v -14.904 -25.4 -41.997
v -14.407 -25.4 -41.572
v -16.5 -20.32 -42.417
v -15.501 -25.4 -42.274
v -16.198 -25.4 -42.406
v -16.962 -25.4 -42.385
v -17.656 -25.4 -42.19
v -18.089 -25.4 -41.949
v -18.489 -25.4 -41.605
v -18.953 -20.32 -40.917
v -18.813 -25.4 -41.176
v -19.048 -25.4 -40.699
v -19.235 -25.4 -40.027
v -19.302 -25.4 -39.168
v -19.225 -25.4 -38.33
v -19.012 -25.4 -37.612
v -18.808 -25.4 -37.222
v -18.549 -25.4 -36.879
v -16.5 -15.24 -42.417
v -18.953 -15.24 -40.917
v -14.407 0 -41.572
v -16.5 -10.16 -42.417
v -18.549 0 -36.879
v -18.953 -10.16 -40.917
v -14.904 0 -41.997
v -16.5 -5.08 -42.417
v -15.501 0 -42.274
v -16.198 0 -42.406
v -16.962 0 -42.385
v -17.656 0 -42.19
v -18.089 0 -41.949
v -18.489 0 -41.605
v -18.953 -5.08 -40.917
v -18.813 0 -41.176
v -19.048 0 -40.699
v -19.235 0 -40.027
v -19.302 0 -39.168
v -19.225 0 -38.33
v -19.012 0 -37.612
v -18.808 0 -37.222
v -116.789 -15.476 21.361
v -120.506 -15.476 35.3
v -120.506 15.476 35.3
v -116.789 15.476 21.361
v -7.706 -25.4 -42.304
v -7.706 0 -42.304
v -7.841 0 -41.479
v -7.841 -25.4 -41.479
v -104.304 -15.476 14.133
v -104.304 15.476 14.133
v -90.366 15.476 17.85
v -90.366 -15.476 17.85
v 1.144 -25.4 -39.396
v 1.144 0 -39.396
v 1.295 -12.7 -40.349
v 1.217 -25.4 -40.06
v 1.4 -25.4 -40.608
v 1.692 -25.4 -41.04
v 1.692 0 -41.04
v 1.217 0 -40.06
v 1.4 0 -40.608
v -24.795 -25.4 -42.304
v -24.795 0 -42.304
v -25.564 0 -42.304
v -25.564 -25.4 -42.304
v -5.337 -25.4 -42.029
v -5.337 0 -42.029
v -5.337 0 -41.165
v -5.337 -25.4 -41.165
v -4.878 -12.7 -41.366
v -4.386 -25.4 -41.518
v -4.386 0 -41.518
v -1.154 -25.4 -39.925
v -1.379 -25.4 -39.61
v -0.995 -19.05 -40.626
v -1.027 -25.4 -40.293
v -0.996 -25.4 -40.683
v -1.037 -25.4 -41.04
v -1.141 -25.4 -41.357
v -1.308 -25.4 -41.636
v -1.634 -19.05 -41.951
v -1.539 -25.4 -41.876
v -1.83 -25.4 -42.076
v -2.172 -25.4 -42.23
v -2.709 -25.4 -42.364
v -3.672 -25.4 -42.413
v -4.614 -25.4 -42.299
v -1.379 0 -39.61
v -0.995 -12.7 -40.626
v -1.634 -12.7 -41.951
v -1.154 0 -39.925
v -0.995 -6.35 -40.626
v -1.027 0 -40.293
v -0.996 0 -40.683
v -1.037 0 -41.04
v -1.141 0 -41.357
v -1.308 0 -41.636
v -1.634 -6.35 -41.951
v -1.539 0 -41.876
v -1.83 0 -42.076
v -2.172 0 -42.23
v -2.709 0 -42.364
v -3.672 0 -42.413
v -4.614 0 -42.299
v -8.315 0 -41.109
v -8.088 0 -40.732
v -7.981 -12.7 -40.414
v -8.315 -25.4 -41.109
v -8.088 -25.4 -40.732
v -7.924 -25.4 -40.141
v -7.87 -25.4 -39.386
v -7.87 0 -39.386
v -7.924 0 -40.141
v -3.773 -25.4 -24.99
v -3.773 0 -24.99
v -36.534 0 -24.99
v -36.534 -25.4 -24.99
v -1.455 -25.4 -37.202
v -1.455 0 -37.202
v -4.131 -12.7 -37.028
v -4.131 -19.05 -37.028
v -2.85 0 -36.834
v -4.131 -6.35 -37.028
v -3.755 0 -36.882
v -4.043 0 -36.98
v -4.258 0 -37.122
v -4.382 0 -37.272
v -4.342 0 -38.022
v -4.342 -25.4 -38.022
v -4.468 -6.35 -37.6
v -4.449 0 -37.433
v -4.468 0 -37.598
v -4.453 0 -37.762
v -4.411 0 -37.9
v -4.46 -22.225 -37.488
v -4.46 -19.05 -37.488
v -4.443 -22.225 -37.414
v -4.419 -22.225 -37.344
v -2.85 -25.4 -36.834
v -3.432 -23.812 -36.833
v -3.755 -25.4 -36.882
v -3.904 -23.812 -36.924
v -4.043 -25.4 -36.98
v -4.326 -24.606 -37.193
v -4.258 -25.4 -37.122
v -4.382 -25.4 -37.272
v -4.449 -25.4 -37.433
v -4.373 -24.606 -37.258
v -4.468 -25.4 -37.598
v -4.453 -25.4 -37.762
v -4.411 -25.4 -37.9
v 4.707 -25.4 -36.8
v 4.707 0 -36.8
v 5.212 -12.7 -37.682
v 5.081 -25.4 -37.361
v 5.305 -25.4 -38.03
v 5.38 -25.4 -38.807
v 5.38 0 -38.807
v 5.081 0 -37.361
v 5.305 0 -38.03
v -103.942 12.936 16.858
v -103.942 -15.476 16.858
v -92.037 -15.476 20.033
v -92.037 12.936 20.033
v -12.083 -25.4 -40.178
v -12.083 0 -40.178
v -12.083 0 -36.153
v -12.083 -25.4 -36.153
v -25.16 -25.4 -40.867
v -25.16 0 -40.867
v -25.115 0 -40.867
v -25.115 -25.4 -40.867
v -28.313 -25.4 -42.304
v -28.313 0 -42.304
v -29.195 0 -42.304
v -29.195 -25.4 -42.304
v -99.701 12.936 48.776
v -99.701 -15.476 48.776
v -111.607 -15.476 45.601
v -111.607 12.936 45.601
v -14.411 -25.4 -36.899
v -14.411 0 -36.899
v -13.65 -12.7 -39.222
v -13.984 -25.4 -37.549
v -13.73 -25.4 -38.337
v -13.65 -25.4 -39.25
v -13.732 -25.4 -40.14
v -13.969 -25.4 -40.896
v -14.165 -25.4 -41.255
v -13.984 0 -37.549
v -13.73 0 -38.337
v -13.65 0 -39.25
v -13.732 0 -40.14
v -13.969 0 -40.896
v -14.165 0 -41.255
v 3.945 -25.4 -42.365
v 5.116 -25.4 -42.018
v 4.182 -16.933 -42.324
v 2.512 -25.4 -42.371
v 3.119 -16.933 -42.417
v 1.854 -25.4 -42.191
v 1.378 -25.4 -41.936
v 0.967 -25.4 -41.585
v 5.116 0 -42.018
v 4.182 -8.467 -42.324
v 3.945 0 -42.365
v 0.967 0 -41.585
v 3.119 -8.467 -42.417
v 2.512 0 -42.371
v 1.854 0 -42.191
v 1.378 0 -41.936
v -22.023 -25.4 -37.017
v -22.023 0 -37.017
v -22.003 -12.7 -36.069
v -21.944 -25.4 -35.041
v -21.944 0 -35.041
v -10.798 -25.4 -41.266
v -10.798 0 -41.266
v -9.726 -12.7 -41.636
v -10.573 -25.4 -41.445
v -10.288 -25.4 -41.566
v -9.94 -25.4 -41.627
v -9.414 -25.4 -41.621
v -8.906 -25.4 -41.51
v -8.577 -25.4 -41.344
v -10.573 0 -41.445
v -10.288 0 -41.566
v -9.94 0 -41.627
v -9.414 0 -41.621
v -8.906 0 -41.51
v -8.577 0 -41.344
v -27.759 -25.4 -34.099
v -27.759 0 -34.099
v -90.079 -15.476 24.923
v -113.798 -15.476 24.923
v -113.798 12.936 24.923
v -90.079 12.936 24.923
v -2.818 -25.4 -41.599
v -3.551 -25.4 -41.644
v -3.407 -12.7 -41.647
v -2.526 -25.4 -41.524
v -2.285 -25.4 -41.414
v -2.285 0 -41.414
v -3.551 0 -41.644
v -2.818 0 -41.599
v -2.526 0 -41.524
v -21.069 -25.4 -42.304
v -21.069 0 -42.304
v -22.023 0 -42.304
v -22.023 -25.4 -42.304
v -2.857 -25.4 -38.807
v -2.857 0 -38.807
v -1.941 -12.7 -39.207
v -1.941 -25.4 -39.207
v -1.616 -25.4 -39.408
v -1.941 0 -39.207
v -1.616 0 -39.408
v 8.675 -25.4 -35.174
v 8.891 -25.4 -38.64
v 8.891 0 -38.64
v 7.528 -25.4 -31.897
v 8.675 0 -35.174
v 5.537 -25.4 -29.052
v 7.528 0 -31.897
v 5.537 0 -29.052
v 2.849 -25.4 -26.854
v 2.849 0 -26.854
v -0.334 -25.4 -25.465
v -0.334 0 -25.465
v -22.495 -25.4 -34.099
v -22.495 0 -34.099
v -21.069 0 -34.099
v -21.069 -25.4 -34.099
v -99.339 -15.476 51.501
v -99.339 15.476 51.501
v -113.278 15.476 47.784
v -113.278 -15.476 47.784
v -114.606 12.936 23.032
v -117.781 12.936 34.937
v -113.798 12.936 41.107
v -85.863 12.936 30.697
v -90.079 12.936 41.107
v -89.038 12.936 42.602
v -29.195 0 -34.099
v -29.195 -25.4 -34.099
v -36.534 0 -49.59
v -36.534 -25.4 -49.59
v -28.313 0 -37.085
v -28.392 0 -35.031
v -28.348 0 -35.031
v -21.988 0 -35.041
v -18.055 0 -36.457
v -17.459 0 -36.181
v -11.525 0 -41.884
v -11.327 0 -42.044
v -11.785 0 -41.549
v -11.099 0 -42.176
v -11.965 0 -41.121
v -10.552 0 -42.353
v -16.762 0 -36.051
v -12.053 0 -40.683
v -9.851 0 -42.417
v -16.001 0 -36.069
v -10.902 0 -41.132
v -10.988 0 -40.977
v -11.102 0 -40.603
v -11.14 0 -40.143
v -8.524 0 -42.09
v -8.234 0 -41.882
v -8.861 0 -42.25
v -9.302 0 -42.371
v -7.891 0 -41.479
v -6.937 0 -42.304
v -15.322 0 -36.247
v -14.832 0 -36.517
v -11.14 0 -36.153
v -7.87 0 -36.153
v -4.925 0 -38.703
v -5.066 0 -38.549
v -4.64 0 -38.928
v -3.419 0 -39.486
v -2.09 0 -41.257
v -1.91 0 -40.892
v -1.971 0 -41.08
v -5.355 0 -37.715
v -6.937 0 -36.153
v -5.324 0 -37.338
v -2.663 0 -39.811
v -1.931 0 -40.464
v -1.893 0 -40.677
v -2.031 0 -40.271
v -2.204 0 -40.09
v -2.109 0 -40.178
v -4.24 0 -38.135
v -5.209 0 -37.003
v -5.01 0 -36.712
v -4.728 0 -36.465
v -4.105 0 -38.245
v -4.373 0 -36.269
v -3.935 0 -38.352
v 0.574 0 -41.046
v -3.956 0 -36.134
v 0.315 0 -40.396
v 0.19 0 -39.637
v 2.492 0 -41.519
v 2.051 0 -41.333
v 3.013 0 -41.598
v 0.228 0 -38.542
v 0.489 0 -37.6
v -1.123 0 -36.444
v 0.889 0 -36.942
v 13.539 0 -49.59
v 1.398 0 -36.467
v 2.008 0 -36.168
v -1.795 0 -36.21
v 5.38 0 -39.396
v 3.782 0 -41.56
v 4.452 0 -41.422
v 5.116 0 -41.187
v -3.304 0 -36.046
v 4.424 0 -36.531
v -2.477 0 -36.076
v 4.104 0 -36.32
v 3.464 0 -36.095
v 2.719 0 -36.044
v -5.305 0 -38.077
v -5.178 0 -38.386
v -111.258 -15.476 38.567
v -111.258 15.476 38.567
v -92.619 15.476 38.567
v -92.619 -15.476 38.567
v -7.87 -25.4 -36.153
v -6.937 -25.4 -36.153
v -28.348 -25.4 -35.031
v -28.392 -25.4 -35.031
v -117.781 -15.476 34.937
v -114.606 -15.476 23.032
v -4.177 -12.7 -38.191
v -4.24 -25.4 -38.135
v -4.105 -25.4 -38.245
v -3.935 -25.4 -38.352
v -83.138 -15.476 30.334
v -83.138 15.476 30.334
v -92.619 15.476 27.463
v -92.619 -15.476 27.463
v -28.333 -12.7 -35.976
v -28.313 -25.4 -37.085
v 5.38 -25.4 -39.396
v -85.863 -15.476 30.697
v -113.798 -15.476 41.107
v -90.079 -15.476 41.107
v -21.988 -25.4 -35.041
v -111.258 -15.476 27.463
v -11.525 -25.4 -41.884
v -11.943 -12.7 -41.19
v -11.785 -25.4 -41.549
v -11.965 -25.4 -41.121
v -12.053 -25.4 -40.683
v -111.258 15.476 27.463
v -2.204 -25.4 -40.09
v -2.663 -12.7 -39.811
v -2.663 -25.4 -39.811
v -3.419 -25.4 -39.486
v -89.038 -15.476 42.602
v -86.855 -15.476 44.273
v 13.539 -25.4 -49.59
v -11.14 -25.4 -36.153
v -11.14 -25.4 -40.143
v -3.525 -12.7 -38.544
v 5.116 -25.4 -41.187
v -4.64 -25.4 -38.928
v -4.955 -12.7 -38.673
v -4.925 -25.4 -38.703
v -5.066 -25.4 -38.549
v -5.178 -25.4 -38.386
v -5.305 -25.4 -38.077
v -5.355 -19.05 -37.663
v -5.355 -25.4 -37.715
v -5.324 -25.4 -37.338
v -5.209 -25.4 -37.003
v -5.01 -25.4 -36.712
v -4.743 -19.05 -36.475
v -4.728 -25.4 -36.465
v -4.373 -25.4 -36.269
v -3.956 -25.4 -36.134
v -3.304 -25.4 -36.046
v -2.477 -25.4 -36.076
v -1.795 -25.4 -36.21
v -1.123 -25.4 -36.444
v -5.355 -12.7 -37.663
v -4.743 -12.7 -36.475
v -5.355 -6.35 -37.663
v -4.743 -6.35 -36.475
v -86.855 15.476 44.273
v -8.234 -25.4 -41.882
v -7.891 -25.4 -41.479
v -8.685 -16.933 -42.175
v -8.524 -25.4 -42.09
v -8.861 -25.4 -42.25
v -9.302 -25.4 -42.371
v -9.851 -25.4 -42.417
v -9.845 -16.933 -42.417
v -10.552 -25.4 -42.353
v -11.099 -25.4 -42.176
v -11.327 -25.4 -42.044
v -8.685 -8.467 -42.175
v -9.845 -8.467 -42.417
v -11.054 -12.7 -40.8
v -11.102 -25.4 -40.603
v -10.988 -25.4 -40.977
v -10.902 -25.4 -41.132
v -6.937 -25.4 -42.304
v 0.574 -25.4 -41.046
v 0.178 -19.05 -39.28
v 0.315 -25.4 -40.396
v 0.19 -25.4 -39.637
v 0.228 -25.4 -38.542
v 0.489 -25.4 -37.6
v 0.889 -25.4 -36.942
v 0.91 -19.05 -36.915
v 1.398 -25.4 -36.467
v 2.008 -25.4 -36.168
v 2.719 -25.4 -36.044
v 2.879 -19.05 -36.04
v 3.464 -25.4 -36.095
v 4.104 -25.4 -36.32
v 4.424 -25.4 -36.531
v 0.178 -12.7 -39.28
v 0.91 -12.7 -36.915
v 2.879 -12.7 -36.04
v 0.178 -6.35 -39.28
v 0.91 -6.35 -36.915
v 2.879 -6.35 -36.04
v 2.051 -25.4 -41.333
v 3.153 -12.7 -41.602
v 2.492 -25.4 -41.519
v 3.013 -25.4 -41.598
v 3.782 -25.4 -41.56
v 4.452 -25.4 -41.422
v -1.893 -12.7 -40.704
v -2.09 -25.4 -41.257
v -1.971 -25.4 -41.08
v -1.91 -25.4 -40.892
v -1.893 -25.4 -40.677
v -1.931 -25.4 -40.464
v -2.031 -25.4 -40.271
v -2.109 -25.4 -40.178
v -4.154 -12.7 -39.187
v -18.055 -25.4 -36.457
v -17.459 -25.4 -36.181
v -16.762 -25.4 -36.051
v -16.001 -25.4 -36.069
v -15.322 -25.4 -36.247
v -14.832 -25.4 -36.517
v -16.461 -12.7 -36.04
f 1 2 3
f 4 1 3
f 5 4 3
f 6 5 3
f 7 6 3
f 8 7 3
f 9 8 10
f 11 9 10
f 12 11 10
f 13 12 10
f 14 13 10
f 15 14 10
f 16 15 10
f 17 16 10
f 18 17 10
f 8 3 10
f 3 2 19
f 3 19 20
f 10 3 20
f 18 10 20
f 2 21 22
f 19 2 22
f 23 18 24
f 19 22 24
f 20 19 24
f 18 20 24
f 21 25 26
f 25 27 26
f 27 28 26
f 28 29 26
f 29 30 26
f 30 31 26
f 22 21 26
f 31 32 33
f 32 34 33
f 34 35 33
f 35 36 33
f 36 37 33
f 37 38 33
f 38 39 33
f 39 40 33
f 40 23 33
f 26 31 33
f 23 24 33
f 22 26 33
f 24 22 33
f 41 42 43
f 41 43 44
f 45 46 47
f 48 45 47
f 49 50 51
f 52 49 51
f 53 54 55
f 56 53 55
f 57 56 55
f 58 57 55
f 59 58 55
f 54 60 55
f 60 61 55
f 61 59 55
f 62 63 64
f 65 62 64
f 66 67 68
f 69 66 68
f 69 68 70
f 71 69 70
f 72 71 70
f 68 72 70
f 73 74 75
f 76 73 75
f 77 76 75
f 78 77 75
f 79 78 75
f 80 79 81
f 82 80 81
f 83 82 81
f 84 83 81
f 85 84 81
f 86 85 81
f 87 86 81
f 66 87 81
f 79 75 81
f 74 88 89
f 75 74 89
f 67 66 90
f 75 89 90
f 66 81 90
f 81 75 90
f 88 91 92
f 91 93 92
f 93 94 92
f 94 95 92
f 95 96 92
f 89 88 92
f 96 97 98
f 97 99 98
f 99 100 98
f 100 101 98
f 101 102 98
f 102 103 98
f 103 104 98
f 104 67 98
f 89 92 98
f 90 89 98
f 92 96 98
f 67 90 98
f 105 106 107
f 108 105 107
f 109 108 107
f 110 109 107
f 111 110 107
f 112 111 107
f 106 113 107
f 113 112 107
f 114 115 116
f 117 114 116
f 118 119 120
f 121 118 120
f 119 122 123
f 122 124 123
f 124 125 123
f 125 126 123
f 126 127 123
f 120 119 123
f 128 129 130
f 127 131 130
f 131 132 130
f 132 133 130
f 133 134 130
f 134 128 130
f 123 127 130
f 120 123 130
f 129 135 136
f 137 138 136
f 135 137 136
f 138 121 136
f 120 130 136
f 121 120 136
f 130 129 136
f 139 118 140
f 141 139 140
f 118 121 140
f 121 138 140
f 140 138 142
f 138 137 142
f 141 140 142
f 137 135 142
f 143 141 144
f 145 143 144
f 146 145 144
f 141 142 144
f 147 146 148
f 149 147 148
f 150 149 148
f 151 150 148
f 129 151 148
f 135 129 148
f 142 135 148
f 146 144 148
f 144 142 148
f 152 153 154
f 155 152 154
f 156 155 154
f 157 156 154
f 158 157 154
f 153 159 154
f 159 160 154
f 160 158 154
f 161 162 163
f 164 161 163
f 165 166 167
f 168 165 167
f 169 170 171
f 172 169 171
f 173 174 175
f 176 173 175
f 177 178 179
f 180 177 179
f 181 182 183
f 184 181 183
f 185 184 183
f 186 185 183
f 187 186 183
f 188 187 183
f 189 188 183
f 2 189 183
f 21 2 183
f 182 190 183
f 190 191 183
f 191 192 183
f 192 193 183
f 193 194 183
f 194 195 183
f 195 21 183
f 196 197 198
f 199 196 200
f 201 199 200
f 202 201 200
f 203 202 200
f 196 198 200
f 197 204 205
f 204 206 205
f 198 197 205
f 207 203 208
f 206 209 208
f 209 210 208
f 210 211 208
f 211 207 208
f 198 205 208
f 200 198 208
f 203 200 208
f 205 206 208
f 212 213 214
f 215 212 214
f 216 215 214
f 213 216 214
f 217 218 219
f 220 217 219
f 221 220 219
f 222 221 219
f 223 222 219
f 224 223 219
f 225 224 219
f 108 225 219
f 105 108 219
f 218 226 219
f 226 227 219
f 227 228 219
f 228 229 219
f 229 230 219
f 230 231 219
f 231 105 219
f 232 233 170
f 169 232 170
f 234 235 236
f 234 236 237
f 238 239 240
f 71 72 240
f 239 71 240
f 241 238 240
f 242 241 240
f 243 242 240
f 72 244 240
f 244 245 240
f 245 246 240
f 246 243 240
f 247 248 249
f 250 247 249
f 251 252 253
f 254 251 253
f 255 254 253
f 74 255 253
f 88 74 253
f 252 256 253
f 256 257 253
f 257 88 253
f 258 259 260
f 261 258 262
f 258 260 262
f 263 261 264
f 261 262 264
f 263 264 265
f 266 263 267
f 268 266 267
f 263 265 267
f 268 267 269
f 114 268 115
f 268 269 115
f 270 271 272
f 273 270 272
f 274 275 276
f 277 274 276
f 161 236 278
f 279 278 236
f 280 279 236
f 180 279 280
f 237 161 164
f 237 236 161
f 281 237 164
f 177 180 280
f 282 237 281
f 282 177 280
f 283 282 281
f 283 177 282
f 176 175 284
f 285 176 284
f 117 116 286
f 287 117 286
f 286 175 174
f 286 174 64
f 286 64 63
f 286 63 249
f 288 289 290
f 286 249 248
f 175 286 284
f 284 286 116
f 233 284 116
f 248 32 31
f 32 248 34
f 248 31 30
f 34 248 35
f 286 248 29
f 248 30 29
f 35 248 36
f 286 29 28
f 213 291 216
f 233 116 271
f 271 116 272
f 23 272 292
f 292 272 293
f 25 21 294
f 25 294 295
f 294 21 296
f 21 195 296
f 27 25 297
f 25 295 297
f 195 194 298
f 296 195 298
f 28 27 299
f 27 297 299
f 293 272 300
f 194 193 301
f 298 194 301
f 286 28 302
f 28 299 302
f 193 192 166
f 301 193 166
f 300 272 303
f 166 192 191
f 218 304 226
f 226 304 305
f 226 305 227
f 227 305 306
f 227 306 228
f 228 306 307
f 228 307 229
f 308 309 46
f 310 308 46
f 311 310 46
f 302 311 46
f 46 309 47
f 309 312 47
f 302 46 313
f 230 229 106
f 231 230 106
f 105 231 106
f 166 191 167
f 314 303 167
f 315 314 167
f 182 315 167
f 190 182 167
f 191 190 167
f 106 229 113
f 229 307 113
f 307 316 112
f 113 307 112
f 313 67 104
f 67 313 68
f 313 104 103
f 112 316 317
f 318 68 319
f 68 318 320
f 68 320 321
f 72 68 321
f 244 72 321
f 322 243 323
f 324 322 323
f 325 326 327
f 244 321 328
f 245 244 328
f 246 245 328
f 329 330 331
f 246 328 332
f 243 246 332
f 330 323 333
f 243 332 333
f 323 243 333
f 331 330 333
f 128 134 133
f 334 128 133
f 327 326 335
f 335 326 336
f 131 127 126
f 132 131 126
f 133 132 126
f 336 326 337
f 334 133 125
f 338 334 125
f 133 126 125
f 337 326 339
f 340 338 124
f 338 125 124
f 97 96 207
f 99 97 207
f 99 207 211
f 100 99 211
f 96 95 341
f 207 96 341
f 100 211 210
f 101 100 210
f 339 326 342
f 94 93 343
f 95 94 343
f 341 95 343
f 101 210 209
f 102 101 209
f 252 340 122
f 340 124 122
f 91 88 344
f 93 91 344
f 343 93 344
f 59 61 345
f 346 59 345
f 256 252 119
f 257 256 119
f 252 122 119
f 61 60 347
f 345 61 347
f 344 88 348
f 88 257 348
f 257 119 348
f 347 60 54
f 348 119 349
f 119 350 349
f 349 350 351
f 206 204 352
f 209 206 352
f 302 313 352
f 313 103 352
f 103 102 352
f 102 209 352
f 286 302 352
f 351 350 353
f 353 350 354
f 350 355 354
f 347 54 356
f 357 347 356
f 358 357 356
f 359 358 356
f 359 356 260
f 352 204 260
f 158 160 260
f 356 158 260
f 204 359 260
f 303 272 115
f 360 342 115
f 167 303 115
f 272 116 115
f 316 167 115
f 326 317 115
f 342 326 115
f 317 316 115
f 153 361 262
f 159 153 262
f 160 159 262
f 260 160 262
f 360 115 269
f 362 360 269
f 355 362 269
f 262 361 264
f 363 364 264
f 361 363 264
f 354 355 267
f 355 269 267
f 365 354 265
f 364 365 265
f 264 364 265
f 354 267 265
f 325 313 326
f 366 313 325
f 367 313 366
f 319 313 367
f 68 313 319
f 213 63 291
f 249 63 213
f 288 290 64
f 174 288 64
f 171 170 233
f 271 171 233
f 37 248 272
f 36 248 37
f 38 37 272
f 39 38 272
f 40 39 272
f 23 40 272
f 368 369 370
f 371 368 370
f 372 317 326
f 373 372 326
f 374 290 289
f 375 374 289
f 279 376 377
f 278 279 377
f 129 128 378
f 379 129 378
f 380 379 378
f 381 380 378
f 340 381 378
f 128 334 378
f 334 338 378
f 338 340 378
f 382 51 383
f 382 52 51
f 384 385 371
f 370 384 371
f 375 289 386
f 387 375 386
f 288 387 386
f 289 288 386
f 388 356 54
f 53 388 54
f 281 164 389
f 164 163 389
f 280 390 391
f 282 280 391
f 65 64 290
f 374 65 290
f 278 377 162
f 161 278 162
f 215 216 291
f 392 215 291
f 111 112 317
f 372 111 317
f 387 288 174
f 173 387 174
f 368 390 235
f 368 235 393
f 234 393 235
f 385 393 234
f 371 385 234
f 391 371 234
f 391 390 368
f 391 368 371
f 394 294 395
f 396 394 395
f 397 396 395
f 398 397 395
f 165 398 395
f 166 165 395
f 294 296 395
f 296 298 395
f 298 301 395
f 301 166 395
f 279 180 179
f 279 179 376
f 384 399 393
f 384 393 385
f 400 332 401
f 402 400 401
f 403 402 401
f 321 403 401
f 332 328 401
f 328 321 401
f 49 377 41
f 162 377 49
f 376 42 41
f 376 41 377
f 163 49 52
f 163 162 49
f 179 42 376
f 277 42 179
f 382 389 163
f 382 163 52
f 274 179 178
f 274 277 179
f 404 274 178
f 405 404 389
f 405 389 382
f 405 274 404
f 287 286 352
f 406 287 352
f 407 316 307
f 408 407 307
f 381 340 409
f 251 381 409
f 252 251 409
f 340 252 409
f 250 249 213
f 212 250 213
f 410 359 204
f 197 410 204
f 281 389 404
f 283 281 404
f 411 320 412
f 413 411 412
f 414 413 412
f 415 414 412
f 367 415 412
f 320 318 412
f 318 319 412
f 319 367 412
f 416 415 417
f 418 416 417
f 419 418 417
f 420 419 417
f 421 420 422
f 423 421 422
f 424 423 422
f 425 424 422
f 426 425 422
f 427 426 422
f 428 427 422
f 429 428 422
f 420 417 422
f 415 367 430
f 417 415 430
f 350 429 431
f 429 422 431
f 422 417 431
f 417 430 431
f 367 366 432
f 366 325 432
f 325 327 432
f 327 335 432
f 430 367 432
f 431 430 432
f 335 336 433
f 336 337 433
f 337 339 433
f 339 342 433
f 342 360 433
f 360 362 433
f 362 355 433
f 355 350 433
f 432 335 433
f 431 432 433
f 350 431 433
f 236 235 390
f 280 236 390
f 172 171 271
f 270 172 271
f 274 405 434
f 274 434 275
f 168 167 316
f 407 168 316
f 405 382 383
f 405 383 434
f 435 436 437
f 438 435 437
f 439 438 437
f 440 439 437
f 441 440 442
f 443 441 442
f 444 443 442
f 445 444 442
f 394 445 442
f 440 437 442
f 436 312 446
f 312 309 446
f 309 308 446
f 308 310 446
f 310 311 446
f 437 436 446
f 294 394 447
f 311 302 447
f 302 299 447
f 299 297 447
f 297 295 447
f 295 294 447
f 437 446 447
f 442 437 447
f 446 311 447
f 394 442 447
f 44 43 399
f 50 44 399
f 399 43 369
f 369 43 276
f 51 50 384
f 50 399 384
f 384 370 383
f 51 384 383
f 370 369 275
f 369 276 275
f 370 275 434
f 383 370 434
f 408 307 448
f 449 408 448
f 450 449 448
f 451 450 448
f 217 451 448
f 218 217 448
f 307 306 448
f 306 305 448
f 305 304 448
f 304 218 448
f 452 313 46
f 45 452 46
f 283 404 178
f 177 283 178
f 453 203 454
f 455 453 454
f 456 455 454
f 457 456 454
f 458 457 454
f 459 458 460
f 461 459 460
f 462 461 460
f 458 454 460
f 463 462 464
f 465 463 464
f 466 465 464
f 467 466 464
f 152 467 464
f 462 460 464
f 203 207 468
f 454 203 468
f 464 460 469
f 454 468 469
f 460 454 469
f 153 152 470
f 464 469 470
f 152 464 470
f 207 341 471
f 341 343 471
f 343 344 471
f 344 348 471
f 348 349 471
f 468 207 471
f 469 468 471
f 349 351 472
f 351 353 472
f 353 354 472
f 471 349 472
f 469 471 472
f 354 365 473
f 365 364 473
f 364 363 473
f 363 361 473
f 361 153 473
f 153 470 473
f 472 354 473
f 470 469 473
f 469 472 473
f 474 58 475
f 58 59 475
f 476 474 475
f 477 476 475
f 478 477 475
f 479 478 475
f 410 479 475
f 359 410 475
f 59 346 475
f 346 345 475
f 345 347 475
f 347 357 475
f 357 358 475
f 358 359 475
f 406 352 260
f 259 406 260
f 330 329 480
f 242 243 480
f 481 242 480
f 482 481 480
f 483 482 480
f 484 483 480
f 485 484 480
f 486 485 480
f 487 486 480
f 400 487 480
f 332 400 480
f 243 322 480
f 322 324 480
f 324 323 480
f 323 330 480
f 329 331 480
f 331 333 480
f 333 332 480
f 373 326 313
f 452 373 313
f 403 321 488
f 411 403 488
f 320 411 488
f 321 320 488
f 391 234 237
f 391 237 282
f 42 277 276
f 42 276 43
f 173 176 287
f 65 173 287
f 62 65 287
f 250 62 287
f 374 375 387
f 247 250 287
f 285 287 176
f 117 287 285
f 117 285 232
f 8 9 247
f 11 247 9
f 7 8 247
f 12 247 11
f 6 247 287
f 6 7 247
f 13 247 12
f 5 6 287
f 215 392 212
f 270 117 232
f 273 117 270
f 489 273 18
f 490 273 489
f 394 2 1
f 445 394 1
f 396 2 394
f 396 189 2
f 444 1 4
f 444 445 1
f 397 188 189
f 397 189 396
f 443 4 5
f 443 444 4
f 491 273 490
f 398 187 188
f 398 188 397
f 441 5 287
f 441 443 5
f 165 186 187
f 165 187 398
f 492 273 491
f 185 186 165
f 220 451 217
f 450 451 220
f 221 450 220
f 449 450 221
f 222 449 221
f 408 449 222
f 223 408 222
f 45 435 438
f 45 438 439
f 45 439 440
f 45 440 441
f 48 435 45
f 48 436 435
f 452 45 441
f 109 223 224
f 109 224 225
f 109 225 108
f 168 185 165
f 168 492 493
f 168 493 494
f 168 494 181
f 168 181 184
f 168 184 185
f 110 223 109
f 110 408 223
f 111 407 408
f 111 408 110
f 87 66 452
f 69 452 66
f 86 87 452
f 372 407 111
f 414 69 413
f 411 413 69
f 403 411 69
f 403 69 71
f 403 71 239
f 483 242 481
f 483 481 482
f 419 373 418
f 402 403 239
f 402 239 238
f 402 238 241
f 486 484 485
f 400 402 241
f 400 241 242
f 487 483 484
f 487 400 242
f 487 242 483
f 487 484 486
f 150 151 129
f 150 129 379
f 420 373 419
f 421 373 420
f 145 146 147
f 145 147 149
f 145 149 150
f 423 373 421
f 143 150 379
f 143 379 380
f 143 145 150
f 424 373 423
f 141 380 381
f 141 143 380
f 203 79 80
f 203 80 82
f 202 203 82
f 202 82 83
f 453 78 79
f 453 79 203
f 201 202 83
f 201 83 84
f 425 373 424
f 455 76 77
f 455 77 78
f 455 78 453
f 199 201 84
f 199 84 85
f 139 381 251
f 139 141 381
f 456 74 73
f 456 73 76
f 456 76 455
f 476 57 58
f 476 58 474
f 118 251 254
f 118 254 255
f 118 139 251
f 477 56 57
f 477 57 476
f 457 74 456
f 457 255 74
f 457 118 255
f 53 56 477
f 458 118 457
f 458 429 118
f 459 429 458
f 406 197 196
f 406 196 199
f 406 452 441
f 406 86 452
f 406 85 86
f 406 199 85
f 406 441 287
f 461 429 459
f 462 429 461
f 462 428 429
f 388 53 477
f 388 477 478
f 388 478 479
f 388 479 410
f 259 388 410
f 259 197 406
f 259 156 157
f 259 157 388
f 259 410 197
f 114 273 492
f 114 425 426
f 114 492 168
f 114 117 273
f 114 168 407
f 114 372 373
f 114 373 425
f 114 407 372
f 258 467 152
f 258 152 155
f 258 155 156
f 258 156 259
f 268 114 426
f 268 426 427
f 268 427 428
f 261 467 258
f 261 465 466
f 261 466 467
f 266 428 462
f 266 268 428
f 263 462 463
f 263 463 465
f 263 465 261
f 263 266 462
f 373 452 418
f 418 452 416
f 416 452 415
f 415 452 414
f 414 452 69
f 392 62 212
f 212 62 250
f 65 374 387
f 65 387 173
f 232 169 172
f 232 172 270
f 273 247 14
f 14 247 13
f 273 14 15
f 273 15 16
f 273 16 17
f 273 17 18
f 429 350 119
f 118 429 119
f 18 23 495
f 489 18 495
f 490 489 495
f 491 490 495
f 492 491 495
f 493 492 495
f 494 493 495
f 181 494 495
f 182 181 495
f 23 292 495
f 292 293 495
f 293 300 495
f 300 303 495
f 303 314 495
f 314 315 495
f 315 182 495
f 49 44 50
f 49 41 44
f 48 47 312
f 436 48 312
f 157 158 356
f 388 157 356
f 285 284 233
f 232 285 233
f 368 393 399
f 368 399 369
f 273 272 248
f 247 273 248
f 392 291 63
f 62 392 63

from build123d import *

# Parameters (mm, degrees)
F1_DEPTH = 25.4
F2_DEPTH = 15.47605
F3_W     = 18.6392664909
F3_H     = 11.1042335629
F4_DEPTH = 30.9521
F5_T     = -2.54


with BuildPart() as f1:
    # F0 (on Front) → F1 (new body)
    with BuildSketch(Plane.XZ):
        with BuildLine():
            Line((-3.773370779, -24.9902736396), (-36.5339256823, -24.9902736396))
            Line((-36.5339256823, -24.9902736396), (-36.5339256823, -37.2901419178))
            Line((-36.5339256823, -37.2901419178), (-36.5339256823, -49.590010196))
            Line((-36.5339256823, -49.590010196), (13.5391952785, -49.590010196))
            Line((13.5391952785, -49.590010196), (8.8910869166, -38.6397531151))
            ThreePointArc((8.8910869166, -38.6397531151), (5.5365268933, -29.052229571), (-3.773370779, -24.9902736396))
        make_face()
        with BuildLine():
            Line((-24.7953651081, -42.3037852307), (-25.5639865894, -42.3037852307))
            Line((-25.5639865894, -42.3037852307), (-28.347545692, -35.0306146721))
            Line((-28.347545692, -35.0306146721), (-28.3924418066, -35.0306146721))
            add(Edge.make_bspline(
                [(-28.3924418066, -35.0306146721), (-28.313424645, -35.8944159162), (-28.313424645, -37.0850608743)],
                knots=[0, 0, 0, 1, 1, 1], degree=2))
            Line((-28.313424645, -37.0850608743), (-28.313424645, -42.3037852307))
            Line((-28.313424645, -42.3037852307), (-29.1951843349, -42.3037852307))
            Line((-29.1951843349, -42.3037852307), (-29.1951843349, -34.0985713339))
            Line((-29.1951843349, -34.0985713339), (-27.758508669, -34.0985713339))
            Line((-27.758508669, -34.0985713339), (-25.1599215583, -40.8671095648))
            Line((-25.1599215583, -40.8671095648), (-25.1150254438, -40.8671095648))
            Line((-25.1150254438, -40.8671095648), (-22.4948881981, -34.0985713339))
            Line((-22.4948881981, -34.0985713339), (-21.0689875997, -34.0985713339))
            Line((-21.0689875997, -34.0985713339), (-21.0689875997, -42.3037852307))
            Line((-21.0689875997, -42.3037852307), (-22.0225810729, -42.3037852307))
            Line((-22.0225810729, -42.3037852307), (-22.0225810729, -37.0168187802))
            add(Edge.make_bspline(
                [(-22.0225810729, -37.0168187802), (-22.0225810729, -36.1081214215), (-21.9435639113, -35.0413897396)],
                knots=[0, 0, 0, 1, 1, 1], degree=2))
            Line((-21.9435639113, -35.0413897396), (-21.9884600258, -35.0413897396))
            Line((-21.9884600258, -35.0413897396), (-24.7953651081, -42.3037852307))
        make_face(mode=Mode.SUBTRACT)
        with BuildLine():
            add(Edge.make_bspline(
                [(-14.4108938105, -36.8991909601), (-13.6503536299, -37.7585025927), (-13.6503536299, -39.2221159274)],
                knots=[0, 0, 0, 1, 1, 1], degree=2))
            add(Edge.make_bspline(
                [(-13.6503536299, -39.2221159274), (-13.6503536299, -40.7270336874), (-14.4073021213, -41.5719785634)],
                knots=[0, 0, 0, 1, 1, 1], degree=2))
            add(Edge.make_bspline(
                [(-14.4073021213, -41.5719785634), (-15.1642506128, -42.4169234394), (-16.5003589821, -42.4169234394)],
                knots=[0, 0, 0, 1, 1, 1], degree=2))
            add(Edge.make_bspline(
                [(-16.5003589821, -42.4169234394), (-17.32644749, -42.4169234394), (-17.9657681613, -42.0290210096)],
                knots=[0, 0, 0, 1, 1, 1], degree=2))
            add(Edge.make_bspline(
                [(-17.9657681613, -42.0290210096), (-18.6050888326, -41.6411185798), (-18.9534826816, -40.9173932131)],
                knots=[0, 0, 0, 1, 1, 1], degree=2))
            add(Edge.make_bspline(
                [(-18.9534826816, -40.9173932131), (-19.3018765306, -40.1936678464), (-19.3018765306, -39.2221159274)],
                knots=[0, 0, 0, 1, 1, 1], degree=2))
            add(Edge.make_bspline(
                [(-19.3018765306, -39.2221159274), (-19.3018765306, -37.7189940119), (-18.5494176506, -36.8794366697)],
                knots=[0, 0, 0, 1, 1, 1], degree=2))
            add(Edge.make_bspline(
                [(-18.5494176506, -36.8794366697), (-17.7969587706, -36.0398793274), (-16.4608504013, -36.0398793274)],
                knots=[0, 0, 0, 1, 1, 1], degree=2))
            add(Edge.make_bspline(
                [(-16.4608504013, -36.0398793274), (-15.1714339911, -36.0398793274), (-14.4108938105, -36.8991909601)],
                knots=[0, 0, 0, 1, 1, 1], degree=2))
        make_face(mode=Mode.SUBTRACT)
        with BuildLine():
            Line((-12.0825813095, -36.1530175361), (-11.1397629037, -36.1530175361))
            Line((-11.1397629037, -36.1530175361), (-11.1397629037, -40.1433841981))
            add(Edge.make_bspline(
                [(-11.1397629037, -40.1433841981), (-11.1397629037, -40.8958430781), (-10.7976545108, -41.2657870621)],
                knots=[0, 0, 0, 1, 1, 1], degree=2))
            add(Edge.make_bspline(
                [(-10.7976545108, -41.2657870621), (-10.4555461178, -41.6357310461), (-9.7264332174, -41.6357310461)],
                knots=[0, 0, 0, 1, 1, 1], degree=2))
            add(Edge.make_bspline(
                [(-9.7264332174, -41.6357310461), (-8.7602688321, -41.6357310461), (-8.3148993756, -41.1086506612)],
                knots=[0, 0, 0, 1, 1, 1], degree=2))
            add(Edge.make_bspline(
                [(-8.3148993756, -41.1086506612), (-7.8695299192, -40.5815702762), (-7.8695299192, -39.3855377844)],
                knots=[0, 0, 0, 1, 1, 1], degree=2))
            Line((-7.8695299192, -39.3855377844), (-7.8695299192, -36.1530175361))
            Line((-7.8695299192, -36.1530175361), (-6.937486581, -36.1530175361))
            Line((-6.937486581, -36.1530175361), (-6.937486581, -42.3037852307))
            Line((-6.937486581, -42.3037852307), (-7.7061080622, -42.3037852307))
            Line((-7.7061080622, -42.3037852307), (-7.8407964059, -41.4794925674))
            Line((-7.8407964059, -41.4794925674), (-7.8910800542, -41.4794925674))
            add(Edge.make_bspline(
                [(-7.8910800542, -41.4794925674), (-8.1766193428, -41.9338412468), (-8.6848433596, -42.1753823431)],
                knots=[0, 0, 0, 1, 1, 1], degree=2))
            add(Edge.make_bspline(
                [(-8.6848433596, -42.1753823431), (-9.1930673764, -42.4169234394), (-9.8449589598, -42.4169234394)],
                knots=[0, 0, 0, 1, 1, 1], degree=2))
            add(Edge.make_bspline(
                [(-9.8449589598, -42.4169234394), (-10.9673618238, -42.4169234394), (-11.5249715666, -41.8835575984)],
                knots=[0, 0, 0, 1, 1, 1], degree=2))
            add(Edge.make_bspline(
                [(-11.5249715666, -41.8835575984), (-12.0825813095, -41.3501917575), (-12.0825813095, -40.1775052452)],
                knots=[0, 0, 0, 1, 1, 1], degree=2))
            Line((-12.0825813095, -40.1775052452), (-12.0825813095, -36.1530175361))
        make_face(mode=Mode.SUBTRACT)
        with BuildLine():
            add(Edge.make_bspline(
                [(-1.3793475985, -39.6100183572), (-0.9950368579, -40.0140833882), (-0.9950368579, -40.6264663908)],
                knots=[0, 0, 0, 1, 1, 1], degree=2))
            add(Edge.make_bspline(
                [(-0.9950368579, -40.6264663908), (-0.9950368579, -41.4848801012), (-1.6343575292, -41.9509017703)],
                knots=[0, 0, 0, 1, 1, 1], degree=2))
            add(Edge.make_bspline(
                [(-1.6343575292, -41.9509017703), (-2.2736782005, -42.4169234394), (-3.4302021116, -42.4169234394)],
                knots=[0, 0, 0, 1, 1, 1], degree=2))
            add(Edge.make_bspline(
                [(-3.4302021116, -42.4169234394), (-4.6531722722, -42.4169234394), (-5.3373890581, -42.0290210096)],
                knots=[0, 0, 0, 1, 1, 1], degree=2))
            Line((-5.3373890581, -42.0290210096), (-5.3373890581, -41.1652197655))
            add(Edge.make_bspline(
                [(-5.3373890581, -41.1652197655), (-4.8938154462, -41.3897003383), (-4.3864893517, -41.5181032259)],
                knots=[0, 0, 0, 1, 1, 1], degree=2))
            add(Edge.make_bspline(
                [(-4.3864893517, -41.5181032259), (-3.8791632572, -41.6465061136), (-3.406856132, -41.6465061136)],
                knots=[0, 0, 0, 1, 1, 1], degree=2))
            add(Edge.make_bspline(
                [(-3.406856132, -41.6465061136), (-2.6777432316, -41.6465061136), (-2.2853511903, -41.4139442402)],
                knots=[0, 0, 0, 1, 1, 1], degree=2))
            add(Edge.make_bspline(
                [(-2.2853511903, -41.4139442402), (-1.8929591491, -41.1813823667), (-1.8929591491, -40.7036877078)],
                knots=[0, 0, 0, 1, 1, 1], degree=2))
            add(Edge.make_bspline(
                [(-1.8929591491, -40.7036877078), (-1.8929591491, -40.3445187914), (-2.2036402618, -40.0895088607)],
                knots=[0, 0, 0, 1, 1, 1], degree=2))
            add(Edge.make_bspline(
                [(-2.2036402618, -40.0895088607), (-2.5143213746, -39.83449893), (-3.4194270441, -39.486105081)],
                knots=[0, 0, 0, 1, 1, 1], degree=2))
            add(Edge.make_bspline(
                [(-3.4194270441, -39.486105081), (-4.2778407545, -39.1664447453), (-4.6397034378, -38.9275974159)],
                knots=[0, 0, 0, 1, 1, 1], degree=2))
            add(Edge.make_bspline(
                [(-4.6397034378, -38.9275974159), (-5.0015661212, -38.6887500864), (-5.1784568125, -38.3861502743)],
                knots=[0, 0, 0, 1, 1, 1], degree=2))
            add(Edge.make_bspline(
                [(-5.1784568125, -38.3861502743), (-5.3553475039, -38.0835504621), (-5.3553475039, -37.6633228299)],
                knots=[0, 0, 0, 1, 1, 1], degree=2))
            add(Edge.make_bspline(
                [(-5.3553475039, -37.6633228299), (-5.3553475039, -36.9108639498), (-4.7429645013, -36.4753716386)],
                knots=[0, 0, 0, 1, 1, 1], degree=2))
            add(Edge.make_bspline(
                [(-4.7429645013, -36.4753716386), (-4.1305814987, -36.0398793274), (-3.0656456614, -36.0398793274)],
                knots=[0, 0, 0, 1, 1, 1], degree=2))
            add(Edge.make_bspline(
                [(-3.0656456614, -36.0398793274), (-2.0725436073, -36.0398793274), (-1.1225418232, -36.4439443584)],
                knots=[0, 0, 0, 1, 1, 1], degree=2))
            Line((-1.1225418232, -36.4439443584), (-1.454773071, -37.2017907722))
            add(Edge.make_bspline(
                [(-1.454773071, -37.2017907722), (-2.3796330309, -36.8210717207), (-3.1320919109, -36.8210717207)],
                knots=[0, 0, 0, 1, 1, 1], degree=2))
            add(Edge.make_bspline(
                [(-3.1320919109, -36.8210717207), (-3.7947585618, -36.8210717207), (-4.131479421, -37.02849177)],
                knots=[0, 0, 0, 1, 1, 1], degree=2))
            add(Edge.make_bspline(
                [(-4.131479421, -37.02849177), (-4.4682002802, -37.2359118193), (-4.4682002802, -37.6004682695)],
                knots=[0, 0, 0, 1, 1, 1], degree=2))
            add(Edge.make_bspline(
                [(-4.4682002802, -37.6004682695), (-4.4682002802, -37.8482948218), (-4.3415932371, -38.021593824)],
                knots=[0, 0, 0, 1, 1, 1], degree=2))
            add(Edge.make_bspline(
                [(-4.3415932371, -38.021593824), (-4.2149861941, -38.1948928262), (-3.9348344392, -38.3520292272)],
                knots=[0, 0, 0, 1, 1, 1], degree=2))
            add(Edge.make_bspline(
                [(-3.9348344392, -38.3520292272), (-3.6546826844, -38.5091656282), (-2.8573276898, -38.8072758288)],
                knots=[0, 0, 0, 1, 1, 1], degree=2))
            add(Edge.make_bspline(
                [(-2.8573276898, -38.8072758288), (-1.7636583391, -39.2059533261), (-1.3793475985, -39.6100183572)],
                knots=[0, 0, 0, 1, 1, 1], degree=2))
        make_face(mode=Mode.SUBTRACT)
        with BuildLine():
            add(Edge.make_bspline(
                [(4.1823830731, -42.3235395211), (3.7424011504, -42.4169234394), (3.1192430803, -42.4169234394)],
                knots=[0, 0, 0, 1, 1, 1], degree=2))
            add(Edge.make_bspline(
                [(3.1192430803, -42.4169234394), (1.7561970423, -42.4169234394), (0.9669233484, -41.5854473978)],
                knots=[0, 0, 0, 1, 1, 1], degree=2))
            add(Edge.make_bspline(
                [(0.9669233484, -41.5854473978), (0.1776496544, -40.7539713561), (0.1776496544, -39.279582954)],
                knots=[0, 0, 0, 1, 1, 1], degree=2))
            add(Edge.make_bspline(
                [(0.1776496544, -39.279582954), (0.1776496544, -37.7908277952), (0.910354244, -36.9153535613)],
                knots=[0, 0, 0, 1, 1, 1], degree=2))
            add(Edge.make_bspline(
                [(0.910354244, -36.9153535613), (1.6430588336, -36.0398793274), (2.8785999063, -36.0398793274)],
                knots=[0, 0, 0, 1, 1, 1], degree=2))
            add(Edge.make_bspline(
                [(2.8785999063, -36.0398793274), (4.0333279728, -36.0398793274), (4.7067696912, -36.800419508)],
                knots=[0, 0, 0, 1, 1, 1], degree=2))
            add(Edge.make_bspline(
                [(4.7067696912, -36.800419508), (5.3802114096, -37.5609596887), (5.3802114096, -38.8072758288)],
                knots=[0, 0, 0, 1, 1, 1], degree=2))
            Line((5.3802114096, -38.8072758288), (5.3802114096, -39.3963128519))
            Line((5.3802114096, -39.3963128519), (1.1438140397, -39.3963128519))
            add(Edge.make_bspline(
                [(1.1438140397, -39.3963128519), (1.172547553, -40.479207135), (1.6915466374, -41.040408567)],
                knots=[0, 0, 0, 1, 1, 1], degree=2))
            add(Edge.make_bspline(
                [(1.6915466374, -41.040408567), (2.2105457217, -41.601609999), (3.1533641274, -41.601609999)],
                knots=[0, 0, 0, 1, 1, 1], degree=2))
            add(Edge.make_bspline(
                [(3.1533641274, -41.601609999), (4.1464661815, -41.601609999), (5.1162222559, -41.1867699005)],
                knots=[0, 0, 0, 1, 1, 1], degree=2))
            Line((5.1162222559, -41.1867699005), (5.1162222559, -42.0182459421))
            add(Edge.make_bspline(
                [(5.1162222559, -42.0182459421), (4.6223649958, -42.2301556028), (4.1823830731, -42.3235395211)],
                knots=[0, 0, 0, 1, 1, 1], degree=2))
        make_face(mode=Mode.SUBTRACT)
    extrude(amount=F1_DEPTH)


with BuildPart() as f2:
    # F0 (on Front) → F2 (new body, symmetric)
    with BuildSketch(Plane.XZ):
        Polygon((-90.3657683966, 17.8500145408), (-83.137943423, 30.3344473508), (-86.8549264702, 44.2731185021), (-99.3393592802, 51.5009434757), (-113.2780304315, 47.7839604286), (-120.5058554051, 35.2995276186), (-116.7888723579, 21.3608564673), (-104.3044395479, 14.1330314937), align=None)
    extrude(amount=F2_DEPTH, both=True)

    # F3 (on face) → F4 (cut, through all)
    with BuildSketch(Plane.XZ.offset(15.47605)):
        with Locations((-101.9386947155, 33.015280962)):
            Rectangle(F3_W, F3_H)
    extrude(amount=-F4_DEPTH, mode=Mode.SUBTRACT)

    # F5
    f5_openings = [f2.faces().sort_by_distance(p)[0] for p in [
        (-97.471269, -15.47605, 16.502142),
    ]]
    offset(amount=F5_T, openings=f5_openings, kind=Kind.INTERSECTION)


solid = Compound([f1.part, f2.part])
